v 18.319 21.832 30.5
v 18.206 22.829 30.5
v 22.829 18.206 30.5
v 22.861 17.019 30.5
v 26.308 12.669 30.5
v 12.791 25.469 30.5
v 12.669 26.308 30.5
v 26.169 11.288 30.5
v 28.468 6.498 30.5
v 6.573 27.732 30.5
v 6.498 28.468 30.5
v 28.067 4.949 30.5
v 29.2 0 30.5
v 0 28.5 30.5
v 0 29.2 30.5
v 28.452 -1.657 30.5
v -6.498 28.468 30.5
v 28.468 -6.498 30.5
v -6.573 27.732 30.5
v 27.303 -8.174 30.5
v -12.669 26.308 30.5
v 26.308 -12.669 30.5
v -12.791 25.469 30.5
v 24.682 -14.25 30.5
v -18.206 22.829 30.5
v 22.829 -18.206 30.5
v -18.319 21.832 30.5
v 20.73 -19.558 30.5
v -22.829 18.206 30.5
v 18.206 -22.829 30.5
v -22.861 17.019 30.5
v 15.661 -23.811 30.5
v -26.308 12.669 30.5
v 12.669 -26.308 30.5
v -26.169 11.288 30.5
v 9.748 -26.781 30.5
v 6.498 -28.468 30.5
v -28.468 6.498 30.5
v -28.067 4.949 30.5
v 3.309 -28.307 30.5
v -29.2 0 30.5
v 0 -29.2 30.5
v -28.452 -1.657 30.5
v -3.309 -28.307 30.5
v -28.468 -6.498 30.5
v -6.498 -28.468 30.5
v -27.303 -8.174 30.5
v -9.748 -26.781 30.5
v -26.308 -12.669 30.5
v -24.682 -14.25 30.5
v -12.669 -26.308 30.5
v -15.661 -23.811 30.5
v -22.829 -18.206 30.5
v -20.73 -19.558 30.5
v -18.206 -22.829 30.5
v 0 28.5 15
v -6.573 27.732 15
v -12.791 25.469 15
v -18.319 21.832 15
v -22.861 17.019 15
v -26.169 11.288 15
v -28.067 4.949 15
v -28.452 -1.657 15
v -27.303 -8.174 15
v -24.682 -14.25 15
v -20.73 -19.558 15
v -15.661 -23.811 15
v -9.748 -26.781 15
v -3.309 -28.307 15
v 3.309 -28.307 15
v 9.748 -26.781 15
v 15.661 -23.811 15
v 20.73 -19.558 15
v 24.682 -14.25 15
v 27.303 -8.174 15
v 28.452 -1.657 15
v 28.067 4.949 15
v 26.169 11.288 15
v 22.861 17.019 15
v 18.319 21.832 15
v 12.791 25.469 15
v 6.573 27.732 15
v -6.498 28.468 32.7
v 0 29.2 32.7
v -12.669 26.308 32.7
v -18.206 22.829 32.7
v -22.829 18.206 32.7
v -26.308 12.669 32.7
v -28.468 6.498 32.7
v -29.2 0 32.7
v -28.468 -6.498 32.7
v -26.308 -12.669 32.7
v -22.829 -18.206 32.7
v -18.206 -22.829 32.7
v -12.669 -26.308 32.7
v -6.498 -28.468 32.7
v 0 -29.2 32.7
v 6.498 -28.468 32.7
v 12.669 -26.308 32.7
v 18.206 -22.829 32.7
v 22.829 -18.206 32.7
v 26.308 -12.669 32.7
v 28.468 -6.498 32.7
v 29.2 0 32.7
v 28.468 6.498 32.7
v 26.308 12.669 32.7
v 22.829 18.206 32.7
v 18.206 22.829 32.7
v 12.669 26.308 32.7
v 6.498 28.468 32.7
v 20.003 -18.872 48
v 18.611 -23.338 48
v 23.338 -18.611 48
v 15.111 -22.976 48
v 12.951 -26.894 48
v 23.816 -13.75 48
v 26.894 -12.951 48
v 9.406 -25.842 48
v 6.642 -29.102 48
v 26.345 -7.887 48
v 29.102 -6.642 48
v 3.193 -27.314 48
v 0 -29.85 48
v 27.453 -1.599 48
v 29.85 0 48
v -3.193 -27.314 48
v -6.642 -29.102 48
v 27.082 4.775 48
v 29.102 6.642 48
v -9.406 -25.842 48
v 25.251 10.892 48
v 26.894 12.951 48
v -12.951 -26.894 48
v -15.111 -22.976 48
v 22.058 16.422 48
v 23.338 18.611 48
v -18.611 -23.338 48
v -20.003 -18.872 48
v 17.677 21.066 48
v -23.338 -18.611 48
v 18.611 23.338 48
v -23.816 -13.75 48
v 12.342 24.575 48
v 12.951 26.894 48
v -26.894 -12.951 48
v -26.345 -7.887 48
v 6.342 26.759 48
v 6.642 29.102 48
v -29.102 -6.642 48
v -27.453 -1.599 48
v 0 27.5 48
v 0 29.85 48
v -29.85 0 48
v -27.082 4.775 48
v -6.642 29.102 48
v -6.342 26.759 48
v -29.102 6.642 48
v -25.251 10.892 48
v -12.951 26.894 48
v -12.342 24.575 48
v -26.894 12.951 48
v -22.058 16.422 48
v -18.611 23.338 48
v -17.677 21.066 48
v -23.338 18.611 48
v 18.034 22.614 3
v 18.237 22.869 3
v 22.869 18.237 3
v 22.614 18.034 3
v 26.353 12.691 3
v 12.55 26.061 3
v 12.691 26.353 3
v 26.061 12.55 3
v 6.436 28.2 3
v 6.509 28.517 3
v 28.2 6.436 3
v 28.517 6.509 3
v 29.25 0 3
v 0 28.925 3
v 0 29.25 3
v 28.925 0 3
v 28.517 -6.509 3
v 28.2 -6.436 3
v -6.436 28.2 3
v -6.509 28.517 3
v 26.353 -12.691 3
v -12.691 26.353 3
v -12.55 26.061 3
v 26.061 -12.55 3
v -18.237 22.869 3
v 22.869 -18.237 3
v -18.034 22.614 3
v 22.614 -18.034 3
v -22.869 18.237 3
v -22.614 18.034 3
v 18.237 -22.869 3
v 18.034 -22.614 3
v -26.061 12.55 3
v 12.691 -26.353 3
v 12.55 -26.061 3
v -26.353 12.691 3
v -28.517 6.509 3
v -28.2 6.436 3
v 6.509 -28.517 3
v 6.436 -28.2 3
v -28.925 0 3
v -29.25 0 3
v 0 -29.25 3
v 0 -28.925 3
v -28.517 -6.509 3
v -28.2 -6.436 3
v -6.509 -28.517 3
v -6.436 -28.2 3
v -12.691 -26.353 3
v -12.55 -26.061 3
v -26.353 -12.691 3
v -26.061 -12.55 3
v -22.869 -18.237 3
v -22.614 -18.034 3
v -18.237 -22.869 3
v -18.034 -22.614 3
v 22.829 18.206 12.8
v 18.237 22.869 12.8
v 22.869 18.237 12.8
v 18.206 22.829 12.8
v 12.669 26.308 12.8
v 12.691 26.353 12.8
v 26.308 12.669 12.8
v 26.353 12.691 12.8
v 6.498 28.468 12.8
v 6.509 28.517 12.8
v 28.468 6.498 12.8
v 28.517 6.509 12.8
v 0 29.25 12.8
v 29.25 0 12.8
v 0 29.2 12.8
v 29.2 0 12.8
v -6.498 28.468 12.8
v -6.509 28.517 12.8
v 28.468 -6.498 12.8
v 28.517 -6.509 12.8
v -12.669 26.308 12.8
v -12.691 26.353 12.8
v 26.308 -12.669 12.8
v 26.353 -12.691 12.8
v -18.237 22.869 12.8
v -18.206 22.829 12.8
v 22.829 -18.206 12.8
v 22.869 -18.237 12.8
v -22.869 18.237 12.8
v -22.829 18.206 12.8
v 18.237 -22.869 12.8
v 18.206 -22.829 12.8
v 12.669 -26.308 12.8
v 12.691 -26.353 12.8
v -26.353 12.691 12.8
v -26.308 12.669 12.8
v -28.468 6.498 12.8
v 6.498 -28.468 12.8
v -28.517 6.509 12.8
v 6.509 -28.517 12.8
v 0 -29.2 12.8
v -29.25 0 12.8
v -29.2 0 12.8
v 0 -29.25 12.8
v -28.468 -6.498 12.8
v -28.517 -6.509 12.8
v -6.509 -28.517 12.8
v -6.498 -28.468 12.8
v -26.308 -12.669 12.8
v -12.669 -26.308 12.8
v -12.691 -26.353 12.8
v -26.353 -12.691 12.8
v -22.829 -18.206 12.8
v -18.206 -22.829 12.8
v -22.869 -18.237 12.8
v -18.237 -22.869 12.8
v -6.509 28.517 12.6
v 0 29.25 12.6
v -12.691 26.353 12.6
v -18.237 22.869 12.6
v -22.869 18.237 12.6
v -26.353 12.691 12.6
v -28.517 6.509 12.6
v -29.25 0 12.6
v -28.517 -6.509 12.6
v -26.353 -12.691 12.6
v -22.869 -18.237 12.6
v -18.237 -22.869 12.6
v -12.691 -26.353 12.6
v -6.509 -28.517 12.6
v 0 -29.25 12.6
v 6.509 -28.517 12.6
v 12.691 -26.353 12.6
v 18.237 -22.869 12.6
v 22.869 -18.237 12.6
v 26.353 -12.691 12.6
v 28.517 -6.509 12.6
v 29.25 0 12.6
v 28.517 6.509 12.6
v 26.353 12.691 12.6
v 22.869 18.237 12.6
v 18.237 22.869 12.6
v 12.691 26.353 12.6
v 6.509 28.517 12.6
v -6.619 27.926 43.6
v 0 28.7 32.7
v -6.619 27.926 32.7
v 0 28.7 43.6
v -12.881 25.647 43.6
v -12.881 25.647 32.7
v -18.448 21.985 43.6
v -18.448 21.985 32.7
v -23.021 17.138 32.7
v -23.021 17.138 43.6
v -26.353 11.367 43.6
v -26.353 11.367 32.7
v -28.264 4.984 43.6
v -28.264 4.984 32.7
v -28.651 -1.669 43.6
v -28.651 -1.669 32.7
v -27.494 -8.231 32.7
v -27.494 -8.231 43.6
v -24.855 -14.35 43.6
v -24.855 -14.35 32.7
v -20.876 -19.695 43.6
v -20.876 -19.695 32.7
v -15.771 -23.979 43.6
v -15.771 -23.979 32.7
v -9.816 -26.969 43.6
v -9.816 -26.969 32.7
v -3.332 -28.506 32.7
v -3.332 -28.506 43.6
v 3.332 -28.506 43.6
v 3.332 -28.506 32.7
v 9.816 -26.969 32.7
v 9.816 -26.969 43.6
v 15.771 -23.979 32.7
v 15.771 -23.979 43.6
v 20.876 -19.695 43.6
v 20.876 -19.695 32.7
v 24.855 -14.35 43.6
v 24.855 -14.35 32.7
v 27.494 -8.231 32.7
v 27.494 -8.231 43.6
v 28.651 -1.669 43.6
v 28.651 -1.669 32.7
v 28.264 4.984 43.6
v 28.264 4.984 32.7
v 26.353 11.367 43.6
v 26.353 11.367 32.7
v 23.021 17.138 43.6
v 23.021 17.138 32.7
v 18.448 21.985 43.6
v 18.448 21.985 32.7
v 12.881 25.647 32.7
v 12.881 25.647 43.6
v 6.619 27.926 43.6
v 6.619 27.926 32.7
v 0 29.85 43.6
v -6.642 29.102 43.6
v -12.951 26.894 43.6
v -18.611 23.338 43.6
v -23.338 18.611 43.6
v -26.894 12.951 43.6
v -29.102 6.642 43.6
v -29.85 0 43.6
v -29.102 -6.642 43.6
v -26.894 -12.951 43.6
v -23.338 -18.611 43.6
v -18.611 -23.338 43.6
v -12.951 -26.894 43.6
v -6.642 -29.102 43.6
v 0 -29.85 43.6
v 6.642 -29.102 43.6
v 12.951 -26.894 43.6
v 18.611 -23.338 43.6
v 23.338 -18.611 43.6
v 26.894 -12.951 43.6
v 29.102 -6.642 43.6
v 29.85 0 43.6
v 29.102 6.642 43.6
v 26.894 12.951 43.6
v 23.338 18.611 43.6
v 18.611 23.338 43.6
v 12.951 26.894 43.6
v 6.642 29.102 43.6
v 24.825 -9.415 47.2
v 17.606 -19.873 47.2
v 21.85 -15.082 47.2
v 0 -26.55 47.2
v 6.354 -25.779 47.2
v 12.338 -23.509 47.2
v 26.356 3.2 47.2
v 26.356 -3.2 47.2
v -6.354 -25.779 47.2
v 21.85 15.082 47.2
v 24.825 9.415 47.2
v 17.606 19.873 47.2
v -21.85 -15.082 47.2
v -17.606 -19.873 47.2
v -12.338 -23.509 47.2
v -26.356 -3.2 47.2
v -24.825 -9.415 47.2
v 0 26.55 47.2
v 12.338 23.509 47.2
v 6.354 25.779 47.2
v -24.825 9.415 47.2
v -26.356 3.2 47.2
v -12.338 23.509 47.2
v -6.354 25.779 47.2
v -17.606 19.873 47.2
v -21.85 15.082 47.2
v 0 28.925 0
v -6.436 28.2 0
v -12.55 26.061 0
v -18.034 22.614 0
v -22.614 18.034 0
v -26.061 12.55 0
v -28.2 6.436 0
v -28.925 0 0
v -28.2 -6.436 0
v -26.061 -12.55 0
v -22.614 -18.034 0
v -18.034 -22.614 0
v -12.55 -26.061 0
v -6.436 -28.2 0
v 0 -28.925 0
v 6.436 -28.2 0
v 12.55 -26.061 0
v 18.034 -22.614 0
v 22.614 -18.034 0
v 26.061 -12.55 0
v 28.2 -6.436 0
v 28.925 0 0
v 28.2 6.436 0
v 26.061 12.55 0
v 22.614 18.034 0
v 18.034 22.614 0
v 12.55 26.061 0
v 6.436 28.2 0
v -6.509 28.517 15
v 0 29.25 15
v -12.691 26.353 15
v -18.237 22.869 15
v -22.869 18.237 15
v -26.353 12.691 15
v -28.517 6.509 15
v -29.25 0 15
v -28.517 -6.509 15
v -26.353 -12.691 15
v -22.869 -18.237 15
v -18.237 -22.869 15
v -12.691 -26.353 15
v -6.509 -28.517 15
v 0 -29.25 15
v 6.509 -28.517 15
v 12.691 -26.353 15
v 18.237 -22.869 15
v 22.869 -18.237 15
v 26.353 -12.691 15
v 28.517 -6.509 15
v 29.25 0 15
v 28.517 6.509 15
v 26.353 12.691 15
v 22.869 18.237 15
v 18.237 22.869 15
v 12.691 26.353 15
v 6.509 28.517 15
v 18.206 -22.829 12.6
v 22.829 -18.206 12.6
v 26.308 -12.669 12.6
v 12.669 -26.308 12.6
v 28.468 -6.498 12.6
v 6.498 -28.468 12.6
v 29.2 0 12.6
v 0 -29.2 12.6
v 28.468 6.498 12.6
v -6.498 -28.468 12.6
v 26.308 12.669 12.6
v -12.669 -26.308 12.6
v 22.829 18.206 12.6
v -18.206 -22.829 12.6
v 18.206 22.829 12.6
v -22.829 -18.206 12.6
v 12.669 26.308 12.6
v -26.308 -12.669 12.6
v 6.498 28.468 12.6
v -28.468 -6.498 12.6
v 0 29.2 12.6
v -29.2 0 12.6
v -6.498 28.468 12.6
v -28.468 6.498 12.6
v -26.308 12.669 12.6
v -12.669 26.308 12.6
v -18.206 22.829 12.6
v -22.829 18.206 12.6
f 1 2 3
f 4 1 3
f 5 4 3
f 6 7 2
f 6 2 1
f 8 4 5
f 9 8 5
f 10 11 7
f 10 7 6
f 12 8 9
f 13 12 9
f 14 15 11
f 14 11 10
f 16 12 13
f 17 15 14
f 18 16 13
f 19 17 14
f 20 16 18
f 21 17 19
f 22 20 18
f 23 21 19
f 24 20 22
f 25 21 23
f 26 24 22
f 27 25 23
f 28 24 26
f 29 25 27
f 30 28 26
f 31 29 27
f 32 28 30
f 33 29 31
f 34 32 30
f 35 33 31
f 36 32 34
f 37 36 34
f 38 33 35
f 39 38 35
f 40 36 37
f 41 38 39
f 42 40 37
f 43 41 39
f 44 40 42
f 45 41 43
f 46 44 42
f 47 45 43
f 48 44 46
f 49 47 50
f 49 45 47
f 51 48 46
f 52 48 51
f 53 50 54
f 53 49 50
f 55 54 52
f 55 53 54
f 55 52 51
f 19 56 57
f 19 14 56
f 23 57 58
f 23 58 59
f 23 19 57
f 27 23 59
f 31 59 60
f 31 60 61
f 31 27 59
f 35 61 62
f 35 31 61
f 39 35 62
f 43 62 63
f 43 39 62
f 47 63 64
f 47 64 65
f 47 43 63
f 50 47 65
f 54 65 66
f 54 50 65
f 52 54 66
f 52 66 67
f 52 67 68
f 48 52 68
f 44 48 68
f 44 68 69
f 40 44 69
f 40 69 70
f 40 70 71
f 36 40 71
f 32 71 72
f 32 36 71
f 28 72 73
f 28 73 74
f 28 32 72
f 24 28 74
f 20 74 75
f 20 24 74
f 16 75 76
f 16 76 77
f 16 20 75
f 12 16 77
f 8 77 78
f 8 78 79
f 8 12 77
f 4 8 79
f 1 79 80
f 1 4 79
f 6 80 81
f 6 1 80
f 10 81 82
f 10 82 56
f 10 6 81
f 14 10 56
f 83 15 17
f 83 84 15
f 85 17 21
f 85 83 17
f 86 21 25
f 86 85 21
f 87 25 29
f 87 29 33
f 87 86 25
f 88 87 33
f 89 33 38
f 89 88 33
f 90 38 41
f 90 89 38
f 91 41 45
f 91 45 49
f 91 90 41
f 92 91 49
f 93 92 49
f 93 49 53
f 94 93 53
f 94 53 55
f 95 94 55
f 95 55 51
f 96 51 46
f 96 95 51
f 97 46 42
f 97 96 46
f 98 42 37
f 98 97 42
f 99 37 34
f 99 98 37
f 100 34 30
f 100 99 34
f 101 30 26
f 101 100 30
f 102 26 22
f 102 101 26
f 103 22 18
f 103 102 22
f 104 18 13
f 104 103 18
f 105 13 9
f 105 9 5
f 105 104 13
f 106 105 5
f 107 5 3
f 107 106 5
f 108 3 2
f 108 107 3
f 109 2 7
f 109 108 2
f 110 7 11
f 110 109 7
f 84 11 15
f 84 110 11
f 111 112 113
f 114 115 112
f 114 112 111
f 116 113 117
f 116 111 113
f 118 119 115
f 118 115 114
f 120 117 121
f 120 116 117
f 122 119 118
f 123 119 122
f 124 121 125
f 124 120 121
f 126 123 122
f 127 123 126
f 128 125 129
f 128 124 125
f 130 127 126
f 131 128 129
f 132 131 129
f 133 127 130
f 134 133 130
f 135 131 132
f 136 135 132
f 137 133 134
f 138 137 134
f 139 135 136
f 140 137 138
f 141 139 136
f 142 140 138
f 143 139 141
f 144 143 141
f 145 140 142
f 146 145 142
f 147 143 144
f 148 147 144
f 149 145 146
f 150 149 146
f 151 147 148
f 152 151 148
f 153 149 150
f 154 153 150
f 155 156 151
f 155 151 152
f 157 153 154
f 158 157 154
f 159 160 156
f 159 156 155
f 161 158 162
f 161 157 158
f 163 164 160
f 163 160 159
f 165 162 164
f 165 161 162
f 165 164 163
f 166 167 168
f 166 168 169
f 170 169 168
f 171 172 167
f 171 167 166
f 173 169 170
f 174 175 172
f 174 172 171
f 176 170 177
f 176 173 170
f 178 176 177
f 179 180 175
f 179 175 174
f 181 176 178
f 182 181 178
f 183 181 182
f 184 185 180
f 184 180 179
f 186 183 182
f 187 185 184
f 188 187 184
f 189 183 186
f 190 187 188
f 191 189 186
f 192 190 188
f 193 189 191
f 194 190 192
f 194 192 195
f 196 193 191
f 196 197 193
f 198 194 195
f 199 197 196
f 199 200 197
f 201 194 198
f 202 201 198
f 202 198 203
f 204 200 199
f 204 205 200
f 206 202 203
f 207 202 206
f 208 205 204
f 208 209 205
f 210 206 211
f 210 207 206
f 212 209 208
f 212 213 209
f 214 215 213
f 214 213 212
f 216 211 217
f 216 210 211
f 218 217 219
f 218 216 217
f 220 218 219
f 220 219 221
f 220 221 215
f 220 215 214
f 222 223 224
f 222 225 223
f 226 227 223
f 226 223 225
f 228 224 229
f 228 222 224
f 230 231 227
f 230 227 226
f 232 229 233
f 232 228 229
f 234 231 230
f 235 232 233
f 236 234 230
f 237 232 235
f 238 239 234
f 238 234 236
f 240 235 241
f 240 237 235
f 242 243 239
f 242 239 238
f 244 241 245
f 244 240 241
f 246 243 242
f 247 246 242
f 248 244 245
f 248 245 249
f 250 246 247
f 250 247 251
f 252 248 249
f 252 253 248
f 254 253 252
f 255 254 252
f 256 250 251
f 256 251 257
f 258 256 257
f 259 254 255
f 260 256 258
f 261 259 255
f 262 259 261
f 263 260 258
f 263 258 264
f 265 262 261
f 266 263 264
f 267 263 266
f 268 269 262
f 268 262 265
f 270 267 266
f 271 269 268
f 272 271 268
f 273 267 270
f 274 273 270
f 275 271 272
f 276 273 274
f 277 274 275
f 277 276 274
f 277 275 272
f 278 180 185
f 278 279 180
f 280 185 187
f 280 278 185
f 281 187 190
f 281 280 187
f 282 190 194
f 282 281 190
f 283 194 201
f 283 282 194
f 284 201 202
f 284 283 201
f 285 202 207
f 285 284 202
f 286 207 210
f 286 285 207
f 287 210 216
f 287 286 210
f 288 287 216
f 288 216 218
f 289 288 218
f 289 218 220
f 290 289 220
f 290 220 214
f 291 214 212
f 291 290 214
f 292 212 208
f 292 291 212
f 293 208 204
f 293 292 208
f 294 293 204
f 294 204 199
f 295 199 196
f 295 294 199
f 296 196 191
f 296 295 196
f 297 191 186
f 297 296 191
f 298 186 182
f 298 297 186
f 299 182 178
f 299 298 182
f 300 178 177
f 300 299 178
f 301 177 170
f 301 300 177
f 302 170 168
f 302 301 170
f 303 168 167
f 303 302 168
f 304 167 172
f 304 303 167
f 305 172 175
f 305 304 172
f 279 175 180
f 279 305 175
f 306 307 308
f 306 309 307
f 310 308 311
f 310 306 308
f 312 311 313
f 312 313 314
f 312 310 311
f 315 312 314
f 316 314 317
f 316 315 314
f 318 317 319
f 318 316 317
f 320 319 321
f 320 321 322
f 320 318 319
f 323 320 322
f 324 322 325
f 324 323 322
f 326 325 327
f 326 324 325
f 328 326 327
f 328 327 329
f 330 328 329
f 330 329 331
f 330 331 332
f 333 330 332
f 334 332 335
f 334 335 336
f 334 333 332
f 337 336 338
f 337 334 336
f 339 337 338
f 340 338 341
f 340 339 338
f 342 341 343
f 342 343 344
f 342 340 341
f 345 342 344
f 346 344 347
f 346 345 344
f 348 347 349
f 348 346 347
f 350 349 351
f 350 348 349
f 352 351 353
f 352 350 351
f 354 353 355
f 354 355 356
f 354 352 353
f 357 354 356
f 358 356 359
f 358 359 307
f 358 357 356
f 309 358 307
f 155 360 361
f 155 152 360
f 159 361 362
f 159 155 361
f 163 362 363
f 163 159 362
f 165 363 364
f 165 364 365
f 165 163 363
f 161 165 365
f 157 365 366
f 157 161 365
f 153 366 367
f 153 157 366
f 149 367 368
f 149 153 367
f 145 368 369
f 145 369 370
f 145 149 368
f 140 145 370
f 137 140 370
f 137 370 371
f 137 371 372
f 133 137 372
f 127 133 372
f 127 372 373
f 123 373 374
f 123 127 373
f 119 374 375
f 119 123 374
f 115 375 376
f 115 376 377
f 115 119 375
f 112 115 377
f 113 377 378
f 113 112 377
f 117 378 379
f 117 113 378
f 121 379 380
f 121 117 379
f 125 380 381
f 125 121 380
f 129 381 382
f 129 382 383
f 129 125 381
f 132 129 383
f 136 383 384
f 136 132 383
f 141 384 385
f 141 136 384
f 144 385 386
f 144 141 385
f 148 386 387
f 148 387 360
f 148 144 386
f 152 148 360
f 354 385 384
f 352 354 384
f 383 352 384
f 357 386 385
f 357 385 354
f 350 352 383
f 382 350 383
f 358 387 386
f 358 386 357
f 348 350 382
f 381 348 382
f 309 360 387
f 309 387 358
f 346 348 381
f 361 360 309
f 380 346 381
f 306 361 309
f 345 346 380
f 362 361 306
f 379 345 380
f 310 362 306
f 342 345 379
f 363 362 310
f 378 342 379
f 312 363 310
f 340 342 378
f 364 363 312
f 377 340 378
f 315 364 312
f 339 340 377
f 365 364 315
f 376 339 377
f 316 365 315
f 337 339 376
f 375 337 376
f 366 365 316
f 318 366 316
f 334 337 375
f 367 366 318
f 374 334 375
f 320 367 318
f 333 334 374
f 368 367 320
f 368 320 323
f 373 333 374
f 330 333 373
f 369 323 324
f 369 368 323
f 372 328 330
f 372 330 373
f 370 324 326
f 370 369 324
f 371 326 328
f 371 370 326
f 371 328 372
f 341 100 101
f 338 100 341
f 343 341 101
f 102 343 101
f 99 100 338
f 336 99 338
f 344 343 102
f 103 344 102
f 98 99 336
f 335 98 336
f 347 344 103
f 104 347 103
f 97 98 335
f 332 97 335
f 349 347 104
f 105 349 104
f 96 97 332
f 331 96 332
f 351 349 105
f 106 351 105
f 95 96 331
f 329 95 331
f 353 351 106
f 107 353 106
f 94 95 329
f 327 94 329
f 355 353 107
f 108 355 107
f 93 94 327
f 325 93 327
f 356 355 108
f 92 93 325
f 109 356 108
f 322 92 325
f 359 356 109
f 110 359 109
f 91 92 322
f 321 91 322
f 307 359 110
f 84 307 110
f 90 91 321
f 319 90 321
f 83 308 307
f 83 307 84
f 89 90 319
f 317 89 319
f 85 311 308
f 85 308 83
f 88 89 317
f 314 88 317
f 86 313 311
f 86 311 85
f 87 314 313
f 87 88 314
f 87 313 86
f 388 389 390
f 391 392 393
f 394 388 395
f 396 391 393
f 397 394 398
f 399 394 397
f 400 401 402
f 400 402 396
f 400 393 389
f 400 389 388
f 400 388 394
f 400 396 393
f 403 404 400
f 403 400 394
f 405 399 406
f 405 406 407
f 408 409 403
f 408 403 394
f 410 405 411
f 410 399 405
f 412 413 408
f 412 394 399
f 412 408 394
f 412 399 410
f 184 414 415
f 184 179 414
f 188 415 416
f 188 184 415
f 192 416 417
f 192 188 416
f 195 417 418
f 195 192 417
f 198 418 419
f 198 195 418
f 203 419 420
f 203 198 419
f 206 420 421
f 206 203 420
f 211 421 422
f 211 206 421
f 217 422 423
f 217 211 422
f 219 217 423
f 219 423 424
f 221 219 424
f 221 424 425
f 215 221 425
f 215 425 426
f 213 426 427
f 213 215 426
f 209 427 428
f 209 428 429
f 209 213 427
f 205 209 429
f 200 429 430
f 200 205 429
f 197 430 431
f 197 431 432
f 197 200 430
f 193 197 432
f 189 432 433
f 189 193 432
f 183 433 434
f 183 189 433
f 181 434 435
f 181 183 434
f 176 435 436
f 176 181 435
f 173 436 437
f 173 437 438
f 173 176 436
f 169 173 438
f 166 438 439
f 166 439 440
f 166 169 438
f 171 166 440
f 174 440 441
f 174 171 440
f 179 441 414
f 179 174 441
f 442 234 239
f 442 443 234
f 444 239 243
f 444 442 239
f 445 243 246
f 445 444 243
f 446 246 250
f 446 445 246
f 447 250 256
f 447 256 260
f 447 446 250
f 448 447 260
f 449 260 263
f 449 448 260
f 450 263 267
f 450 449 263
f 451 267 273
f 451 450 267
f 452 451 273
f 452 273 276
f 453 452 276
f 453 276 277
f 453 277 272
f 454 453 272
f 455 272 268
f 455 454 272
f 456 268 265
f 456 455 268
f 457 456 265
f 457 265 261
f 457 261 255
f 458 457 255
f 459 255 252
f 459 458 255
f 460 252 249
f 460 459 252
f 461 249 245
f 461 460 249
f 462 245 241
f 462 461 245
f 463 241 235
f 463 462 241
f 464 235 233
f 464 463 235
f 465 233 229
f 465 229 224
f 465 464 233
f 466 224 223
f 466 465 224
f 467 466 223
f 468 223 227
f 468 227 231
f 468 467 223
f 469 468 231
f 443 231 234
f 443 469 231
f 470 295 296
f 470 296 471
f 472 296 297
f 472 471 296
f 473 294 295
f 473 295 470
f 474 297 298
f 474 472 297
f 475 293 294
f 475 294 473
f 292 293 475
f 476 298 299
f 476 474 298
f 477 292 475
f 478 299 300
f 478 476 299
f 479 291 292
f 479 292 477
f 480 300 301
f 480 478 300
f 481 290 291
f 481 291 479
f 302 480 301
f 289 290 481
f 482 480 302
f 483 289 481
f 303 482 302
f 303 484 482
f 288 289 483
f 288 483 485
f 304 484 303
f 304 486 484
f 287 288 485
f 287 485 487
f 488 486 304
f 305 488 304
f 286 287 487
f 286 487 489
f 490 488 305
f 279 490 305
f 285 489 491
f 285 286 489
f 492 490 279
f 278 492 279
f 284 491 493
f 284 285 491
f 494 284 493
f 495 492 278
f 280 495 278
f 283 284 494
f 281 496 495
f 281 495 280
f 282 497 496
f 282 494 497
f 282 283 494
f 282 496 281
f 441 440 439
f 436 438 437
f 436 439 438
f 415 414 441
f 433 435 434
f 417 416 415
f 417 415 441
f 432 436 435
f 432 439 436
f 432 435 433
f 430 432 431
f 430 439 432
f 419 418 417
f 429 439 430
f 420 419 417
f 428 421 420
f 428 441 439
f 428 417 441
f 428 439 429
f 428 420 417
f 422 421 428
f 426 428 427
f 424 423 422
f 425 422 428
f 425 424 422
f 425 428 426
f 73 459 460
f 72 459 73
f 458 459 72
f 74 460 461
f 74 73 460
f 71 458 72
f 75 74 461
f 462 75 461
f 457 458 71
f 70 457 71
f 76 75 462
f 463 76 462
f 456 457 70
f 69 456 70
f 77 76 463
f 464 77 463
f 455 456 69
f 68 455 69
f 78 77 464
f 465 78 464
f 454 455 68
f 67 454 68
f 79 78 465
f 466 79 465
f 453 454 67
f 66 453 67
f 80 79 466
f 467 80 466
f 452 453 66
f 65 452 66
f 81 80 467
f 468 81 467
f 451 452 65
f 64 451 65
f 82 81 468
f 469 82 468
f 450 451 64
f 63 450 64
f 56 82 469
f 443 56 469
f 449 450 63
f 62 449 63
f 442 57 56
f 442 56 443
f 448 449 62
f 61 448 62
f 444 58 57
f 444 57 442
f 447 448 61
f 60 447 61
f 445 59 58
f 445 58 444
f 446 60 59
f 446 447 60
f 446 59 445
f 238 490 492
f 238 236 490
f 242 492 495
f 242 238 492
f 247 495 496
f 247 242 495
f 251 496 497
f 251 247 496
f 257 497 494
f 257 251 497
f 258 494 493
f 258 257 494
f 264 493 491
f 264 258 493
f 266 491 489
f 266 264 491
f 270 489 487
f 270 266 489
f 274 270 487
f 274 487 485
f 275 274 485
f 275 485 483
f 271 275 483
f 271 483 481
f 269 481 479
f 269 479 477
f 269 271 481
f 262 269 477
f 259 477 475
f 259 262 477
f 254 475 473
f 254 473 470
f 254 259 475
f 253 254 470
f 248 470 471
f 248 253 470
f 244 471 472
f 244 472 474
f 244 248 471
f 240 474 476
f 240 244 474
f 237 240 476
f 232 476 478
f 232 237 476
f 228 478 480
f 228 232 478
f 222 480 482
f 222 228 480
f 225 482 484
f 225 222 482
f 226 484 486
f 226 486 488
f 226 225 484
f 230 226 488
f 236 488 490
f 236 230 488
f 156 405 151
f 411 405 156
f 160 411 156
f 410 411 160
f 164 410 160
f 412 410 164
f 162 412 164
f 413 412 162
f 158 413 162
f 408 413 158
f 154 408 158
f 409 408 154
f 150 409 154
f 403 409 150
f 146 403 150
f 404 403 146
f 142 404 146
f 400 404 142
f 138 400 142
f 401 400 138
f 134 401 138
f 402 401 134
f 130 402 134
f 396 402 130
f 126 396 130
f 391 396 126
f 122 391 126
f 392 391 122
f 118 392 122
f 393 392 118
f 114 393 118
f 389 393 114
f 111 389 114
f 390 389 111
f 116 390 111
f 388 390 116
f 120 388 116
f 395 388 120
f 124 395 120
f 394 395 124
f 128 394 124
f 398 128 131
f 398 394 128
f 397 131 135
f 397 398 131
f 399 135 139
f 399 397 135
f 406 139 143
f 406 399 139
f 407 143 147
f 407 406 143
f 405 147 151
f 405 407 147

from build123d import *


with BuildPart() as f1:
    # F0 (on Right) → F1 (revolve)
    with BuildSketch(Plane.YZ):
        Polygon((0, 0), (28.925, 0), (28.925, 3), (29.25, 3), (29.25, 12.6), (29.2, 12.6), (29.2, 12.8), (29.25, 12.8), (29.25, 15), (28.5, 15), (28.5, 30.5), (29.2, 30.5), (29.2, 32.7), (28.7, 32.7), (28.7, 43.6), (29.85, 43.6), (29.85, 48), (27.5, 48), (26.55, 47.2), (0, 47.2), align=None)
    revolve(axis=Axis((0, 0, 53.454532), (0, 0, 1)))


solid = f1.part
